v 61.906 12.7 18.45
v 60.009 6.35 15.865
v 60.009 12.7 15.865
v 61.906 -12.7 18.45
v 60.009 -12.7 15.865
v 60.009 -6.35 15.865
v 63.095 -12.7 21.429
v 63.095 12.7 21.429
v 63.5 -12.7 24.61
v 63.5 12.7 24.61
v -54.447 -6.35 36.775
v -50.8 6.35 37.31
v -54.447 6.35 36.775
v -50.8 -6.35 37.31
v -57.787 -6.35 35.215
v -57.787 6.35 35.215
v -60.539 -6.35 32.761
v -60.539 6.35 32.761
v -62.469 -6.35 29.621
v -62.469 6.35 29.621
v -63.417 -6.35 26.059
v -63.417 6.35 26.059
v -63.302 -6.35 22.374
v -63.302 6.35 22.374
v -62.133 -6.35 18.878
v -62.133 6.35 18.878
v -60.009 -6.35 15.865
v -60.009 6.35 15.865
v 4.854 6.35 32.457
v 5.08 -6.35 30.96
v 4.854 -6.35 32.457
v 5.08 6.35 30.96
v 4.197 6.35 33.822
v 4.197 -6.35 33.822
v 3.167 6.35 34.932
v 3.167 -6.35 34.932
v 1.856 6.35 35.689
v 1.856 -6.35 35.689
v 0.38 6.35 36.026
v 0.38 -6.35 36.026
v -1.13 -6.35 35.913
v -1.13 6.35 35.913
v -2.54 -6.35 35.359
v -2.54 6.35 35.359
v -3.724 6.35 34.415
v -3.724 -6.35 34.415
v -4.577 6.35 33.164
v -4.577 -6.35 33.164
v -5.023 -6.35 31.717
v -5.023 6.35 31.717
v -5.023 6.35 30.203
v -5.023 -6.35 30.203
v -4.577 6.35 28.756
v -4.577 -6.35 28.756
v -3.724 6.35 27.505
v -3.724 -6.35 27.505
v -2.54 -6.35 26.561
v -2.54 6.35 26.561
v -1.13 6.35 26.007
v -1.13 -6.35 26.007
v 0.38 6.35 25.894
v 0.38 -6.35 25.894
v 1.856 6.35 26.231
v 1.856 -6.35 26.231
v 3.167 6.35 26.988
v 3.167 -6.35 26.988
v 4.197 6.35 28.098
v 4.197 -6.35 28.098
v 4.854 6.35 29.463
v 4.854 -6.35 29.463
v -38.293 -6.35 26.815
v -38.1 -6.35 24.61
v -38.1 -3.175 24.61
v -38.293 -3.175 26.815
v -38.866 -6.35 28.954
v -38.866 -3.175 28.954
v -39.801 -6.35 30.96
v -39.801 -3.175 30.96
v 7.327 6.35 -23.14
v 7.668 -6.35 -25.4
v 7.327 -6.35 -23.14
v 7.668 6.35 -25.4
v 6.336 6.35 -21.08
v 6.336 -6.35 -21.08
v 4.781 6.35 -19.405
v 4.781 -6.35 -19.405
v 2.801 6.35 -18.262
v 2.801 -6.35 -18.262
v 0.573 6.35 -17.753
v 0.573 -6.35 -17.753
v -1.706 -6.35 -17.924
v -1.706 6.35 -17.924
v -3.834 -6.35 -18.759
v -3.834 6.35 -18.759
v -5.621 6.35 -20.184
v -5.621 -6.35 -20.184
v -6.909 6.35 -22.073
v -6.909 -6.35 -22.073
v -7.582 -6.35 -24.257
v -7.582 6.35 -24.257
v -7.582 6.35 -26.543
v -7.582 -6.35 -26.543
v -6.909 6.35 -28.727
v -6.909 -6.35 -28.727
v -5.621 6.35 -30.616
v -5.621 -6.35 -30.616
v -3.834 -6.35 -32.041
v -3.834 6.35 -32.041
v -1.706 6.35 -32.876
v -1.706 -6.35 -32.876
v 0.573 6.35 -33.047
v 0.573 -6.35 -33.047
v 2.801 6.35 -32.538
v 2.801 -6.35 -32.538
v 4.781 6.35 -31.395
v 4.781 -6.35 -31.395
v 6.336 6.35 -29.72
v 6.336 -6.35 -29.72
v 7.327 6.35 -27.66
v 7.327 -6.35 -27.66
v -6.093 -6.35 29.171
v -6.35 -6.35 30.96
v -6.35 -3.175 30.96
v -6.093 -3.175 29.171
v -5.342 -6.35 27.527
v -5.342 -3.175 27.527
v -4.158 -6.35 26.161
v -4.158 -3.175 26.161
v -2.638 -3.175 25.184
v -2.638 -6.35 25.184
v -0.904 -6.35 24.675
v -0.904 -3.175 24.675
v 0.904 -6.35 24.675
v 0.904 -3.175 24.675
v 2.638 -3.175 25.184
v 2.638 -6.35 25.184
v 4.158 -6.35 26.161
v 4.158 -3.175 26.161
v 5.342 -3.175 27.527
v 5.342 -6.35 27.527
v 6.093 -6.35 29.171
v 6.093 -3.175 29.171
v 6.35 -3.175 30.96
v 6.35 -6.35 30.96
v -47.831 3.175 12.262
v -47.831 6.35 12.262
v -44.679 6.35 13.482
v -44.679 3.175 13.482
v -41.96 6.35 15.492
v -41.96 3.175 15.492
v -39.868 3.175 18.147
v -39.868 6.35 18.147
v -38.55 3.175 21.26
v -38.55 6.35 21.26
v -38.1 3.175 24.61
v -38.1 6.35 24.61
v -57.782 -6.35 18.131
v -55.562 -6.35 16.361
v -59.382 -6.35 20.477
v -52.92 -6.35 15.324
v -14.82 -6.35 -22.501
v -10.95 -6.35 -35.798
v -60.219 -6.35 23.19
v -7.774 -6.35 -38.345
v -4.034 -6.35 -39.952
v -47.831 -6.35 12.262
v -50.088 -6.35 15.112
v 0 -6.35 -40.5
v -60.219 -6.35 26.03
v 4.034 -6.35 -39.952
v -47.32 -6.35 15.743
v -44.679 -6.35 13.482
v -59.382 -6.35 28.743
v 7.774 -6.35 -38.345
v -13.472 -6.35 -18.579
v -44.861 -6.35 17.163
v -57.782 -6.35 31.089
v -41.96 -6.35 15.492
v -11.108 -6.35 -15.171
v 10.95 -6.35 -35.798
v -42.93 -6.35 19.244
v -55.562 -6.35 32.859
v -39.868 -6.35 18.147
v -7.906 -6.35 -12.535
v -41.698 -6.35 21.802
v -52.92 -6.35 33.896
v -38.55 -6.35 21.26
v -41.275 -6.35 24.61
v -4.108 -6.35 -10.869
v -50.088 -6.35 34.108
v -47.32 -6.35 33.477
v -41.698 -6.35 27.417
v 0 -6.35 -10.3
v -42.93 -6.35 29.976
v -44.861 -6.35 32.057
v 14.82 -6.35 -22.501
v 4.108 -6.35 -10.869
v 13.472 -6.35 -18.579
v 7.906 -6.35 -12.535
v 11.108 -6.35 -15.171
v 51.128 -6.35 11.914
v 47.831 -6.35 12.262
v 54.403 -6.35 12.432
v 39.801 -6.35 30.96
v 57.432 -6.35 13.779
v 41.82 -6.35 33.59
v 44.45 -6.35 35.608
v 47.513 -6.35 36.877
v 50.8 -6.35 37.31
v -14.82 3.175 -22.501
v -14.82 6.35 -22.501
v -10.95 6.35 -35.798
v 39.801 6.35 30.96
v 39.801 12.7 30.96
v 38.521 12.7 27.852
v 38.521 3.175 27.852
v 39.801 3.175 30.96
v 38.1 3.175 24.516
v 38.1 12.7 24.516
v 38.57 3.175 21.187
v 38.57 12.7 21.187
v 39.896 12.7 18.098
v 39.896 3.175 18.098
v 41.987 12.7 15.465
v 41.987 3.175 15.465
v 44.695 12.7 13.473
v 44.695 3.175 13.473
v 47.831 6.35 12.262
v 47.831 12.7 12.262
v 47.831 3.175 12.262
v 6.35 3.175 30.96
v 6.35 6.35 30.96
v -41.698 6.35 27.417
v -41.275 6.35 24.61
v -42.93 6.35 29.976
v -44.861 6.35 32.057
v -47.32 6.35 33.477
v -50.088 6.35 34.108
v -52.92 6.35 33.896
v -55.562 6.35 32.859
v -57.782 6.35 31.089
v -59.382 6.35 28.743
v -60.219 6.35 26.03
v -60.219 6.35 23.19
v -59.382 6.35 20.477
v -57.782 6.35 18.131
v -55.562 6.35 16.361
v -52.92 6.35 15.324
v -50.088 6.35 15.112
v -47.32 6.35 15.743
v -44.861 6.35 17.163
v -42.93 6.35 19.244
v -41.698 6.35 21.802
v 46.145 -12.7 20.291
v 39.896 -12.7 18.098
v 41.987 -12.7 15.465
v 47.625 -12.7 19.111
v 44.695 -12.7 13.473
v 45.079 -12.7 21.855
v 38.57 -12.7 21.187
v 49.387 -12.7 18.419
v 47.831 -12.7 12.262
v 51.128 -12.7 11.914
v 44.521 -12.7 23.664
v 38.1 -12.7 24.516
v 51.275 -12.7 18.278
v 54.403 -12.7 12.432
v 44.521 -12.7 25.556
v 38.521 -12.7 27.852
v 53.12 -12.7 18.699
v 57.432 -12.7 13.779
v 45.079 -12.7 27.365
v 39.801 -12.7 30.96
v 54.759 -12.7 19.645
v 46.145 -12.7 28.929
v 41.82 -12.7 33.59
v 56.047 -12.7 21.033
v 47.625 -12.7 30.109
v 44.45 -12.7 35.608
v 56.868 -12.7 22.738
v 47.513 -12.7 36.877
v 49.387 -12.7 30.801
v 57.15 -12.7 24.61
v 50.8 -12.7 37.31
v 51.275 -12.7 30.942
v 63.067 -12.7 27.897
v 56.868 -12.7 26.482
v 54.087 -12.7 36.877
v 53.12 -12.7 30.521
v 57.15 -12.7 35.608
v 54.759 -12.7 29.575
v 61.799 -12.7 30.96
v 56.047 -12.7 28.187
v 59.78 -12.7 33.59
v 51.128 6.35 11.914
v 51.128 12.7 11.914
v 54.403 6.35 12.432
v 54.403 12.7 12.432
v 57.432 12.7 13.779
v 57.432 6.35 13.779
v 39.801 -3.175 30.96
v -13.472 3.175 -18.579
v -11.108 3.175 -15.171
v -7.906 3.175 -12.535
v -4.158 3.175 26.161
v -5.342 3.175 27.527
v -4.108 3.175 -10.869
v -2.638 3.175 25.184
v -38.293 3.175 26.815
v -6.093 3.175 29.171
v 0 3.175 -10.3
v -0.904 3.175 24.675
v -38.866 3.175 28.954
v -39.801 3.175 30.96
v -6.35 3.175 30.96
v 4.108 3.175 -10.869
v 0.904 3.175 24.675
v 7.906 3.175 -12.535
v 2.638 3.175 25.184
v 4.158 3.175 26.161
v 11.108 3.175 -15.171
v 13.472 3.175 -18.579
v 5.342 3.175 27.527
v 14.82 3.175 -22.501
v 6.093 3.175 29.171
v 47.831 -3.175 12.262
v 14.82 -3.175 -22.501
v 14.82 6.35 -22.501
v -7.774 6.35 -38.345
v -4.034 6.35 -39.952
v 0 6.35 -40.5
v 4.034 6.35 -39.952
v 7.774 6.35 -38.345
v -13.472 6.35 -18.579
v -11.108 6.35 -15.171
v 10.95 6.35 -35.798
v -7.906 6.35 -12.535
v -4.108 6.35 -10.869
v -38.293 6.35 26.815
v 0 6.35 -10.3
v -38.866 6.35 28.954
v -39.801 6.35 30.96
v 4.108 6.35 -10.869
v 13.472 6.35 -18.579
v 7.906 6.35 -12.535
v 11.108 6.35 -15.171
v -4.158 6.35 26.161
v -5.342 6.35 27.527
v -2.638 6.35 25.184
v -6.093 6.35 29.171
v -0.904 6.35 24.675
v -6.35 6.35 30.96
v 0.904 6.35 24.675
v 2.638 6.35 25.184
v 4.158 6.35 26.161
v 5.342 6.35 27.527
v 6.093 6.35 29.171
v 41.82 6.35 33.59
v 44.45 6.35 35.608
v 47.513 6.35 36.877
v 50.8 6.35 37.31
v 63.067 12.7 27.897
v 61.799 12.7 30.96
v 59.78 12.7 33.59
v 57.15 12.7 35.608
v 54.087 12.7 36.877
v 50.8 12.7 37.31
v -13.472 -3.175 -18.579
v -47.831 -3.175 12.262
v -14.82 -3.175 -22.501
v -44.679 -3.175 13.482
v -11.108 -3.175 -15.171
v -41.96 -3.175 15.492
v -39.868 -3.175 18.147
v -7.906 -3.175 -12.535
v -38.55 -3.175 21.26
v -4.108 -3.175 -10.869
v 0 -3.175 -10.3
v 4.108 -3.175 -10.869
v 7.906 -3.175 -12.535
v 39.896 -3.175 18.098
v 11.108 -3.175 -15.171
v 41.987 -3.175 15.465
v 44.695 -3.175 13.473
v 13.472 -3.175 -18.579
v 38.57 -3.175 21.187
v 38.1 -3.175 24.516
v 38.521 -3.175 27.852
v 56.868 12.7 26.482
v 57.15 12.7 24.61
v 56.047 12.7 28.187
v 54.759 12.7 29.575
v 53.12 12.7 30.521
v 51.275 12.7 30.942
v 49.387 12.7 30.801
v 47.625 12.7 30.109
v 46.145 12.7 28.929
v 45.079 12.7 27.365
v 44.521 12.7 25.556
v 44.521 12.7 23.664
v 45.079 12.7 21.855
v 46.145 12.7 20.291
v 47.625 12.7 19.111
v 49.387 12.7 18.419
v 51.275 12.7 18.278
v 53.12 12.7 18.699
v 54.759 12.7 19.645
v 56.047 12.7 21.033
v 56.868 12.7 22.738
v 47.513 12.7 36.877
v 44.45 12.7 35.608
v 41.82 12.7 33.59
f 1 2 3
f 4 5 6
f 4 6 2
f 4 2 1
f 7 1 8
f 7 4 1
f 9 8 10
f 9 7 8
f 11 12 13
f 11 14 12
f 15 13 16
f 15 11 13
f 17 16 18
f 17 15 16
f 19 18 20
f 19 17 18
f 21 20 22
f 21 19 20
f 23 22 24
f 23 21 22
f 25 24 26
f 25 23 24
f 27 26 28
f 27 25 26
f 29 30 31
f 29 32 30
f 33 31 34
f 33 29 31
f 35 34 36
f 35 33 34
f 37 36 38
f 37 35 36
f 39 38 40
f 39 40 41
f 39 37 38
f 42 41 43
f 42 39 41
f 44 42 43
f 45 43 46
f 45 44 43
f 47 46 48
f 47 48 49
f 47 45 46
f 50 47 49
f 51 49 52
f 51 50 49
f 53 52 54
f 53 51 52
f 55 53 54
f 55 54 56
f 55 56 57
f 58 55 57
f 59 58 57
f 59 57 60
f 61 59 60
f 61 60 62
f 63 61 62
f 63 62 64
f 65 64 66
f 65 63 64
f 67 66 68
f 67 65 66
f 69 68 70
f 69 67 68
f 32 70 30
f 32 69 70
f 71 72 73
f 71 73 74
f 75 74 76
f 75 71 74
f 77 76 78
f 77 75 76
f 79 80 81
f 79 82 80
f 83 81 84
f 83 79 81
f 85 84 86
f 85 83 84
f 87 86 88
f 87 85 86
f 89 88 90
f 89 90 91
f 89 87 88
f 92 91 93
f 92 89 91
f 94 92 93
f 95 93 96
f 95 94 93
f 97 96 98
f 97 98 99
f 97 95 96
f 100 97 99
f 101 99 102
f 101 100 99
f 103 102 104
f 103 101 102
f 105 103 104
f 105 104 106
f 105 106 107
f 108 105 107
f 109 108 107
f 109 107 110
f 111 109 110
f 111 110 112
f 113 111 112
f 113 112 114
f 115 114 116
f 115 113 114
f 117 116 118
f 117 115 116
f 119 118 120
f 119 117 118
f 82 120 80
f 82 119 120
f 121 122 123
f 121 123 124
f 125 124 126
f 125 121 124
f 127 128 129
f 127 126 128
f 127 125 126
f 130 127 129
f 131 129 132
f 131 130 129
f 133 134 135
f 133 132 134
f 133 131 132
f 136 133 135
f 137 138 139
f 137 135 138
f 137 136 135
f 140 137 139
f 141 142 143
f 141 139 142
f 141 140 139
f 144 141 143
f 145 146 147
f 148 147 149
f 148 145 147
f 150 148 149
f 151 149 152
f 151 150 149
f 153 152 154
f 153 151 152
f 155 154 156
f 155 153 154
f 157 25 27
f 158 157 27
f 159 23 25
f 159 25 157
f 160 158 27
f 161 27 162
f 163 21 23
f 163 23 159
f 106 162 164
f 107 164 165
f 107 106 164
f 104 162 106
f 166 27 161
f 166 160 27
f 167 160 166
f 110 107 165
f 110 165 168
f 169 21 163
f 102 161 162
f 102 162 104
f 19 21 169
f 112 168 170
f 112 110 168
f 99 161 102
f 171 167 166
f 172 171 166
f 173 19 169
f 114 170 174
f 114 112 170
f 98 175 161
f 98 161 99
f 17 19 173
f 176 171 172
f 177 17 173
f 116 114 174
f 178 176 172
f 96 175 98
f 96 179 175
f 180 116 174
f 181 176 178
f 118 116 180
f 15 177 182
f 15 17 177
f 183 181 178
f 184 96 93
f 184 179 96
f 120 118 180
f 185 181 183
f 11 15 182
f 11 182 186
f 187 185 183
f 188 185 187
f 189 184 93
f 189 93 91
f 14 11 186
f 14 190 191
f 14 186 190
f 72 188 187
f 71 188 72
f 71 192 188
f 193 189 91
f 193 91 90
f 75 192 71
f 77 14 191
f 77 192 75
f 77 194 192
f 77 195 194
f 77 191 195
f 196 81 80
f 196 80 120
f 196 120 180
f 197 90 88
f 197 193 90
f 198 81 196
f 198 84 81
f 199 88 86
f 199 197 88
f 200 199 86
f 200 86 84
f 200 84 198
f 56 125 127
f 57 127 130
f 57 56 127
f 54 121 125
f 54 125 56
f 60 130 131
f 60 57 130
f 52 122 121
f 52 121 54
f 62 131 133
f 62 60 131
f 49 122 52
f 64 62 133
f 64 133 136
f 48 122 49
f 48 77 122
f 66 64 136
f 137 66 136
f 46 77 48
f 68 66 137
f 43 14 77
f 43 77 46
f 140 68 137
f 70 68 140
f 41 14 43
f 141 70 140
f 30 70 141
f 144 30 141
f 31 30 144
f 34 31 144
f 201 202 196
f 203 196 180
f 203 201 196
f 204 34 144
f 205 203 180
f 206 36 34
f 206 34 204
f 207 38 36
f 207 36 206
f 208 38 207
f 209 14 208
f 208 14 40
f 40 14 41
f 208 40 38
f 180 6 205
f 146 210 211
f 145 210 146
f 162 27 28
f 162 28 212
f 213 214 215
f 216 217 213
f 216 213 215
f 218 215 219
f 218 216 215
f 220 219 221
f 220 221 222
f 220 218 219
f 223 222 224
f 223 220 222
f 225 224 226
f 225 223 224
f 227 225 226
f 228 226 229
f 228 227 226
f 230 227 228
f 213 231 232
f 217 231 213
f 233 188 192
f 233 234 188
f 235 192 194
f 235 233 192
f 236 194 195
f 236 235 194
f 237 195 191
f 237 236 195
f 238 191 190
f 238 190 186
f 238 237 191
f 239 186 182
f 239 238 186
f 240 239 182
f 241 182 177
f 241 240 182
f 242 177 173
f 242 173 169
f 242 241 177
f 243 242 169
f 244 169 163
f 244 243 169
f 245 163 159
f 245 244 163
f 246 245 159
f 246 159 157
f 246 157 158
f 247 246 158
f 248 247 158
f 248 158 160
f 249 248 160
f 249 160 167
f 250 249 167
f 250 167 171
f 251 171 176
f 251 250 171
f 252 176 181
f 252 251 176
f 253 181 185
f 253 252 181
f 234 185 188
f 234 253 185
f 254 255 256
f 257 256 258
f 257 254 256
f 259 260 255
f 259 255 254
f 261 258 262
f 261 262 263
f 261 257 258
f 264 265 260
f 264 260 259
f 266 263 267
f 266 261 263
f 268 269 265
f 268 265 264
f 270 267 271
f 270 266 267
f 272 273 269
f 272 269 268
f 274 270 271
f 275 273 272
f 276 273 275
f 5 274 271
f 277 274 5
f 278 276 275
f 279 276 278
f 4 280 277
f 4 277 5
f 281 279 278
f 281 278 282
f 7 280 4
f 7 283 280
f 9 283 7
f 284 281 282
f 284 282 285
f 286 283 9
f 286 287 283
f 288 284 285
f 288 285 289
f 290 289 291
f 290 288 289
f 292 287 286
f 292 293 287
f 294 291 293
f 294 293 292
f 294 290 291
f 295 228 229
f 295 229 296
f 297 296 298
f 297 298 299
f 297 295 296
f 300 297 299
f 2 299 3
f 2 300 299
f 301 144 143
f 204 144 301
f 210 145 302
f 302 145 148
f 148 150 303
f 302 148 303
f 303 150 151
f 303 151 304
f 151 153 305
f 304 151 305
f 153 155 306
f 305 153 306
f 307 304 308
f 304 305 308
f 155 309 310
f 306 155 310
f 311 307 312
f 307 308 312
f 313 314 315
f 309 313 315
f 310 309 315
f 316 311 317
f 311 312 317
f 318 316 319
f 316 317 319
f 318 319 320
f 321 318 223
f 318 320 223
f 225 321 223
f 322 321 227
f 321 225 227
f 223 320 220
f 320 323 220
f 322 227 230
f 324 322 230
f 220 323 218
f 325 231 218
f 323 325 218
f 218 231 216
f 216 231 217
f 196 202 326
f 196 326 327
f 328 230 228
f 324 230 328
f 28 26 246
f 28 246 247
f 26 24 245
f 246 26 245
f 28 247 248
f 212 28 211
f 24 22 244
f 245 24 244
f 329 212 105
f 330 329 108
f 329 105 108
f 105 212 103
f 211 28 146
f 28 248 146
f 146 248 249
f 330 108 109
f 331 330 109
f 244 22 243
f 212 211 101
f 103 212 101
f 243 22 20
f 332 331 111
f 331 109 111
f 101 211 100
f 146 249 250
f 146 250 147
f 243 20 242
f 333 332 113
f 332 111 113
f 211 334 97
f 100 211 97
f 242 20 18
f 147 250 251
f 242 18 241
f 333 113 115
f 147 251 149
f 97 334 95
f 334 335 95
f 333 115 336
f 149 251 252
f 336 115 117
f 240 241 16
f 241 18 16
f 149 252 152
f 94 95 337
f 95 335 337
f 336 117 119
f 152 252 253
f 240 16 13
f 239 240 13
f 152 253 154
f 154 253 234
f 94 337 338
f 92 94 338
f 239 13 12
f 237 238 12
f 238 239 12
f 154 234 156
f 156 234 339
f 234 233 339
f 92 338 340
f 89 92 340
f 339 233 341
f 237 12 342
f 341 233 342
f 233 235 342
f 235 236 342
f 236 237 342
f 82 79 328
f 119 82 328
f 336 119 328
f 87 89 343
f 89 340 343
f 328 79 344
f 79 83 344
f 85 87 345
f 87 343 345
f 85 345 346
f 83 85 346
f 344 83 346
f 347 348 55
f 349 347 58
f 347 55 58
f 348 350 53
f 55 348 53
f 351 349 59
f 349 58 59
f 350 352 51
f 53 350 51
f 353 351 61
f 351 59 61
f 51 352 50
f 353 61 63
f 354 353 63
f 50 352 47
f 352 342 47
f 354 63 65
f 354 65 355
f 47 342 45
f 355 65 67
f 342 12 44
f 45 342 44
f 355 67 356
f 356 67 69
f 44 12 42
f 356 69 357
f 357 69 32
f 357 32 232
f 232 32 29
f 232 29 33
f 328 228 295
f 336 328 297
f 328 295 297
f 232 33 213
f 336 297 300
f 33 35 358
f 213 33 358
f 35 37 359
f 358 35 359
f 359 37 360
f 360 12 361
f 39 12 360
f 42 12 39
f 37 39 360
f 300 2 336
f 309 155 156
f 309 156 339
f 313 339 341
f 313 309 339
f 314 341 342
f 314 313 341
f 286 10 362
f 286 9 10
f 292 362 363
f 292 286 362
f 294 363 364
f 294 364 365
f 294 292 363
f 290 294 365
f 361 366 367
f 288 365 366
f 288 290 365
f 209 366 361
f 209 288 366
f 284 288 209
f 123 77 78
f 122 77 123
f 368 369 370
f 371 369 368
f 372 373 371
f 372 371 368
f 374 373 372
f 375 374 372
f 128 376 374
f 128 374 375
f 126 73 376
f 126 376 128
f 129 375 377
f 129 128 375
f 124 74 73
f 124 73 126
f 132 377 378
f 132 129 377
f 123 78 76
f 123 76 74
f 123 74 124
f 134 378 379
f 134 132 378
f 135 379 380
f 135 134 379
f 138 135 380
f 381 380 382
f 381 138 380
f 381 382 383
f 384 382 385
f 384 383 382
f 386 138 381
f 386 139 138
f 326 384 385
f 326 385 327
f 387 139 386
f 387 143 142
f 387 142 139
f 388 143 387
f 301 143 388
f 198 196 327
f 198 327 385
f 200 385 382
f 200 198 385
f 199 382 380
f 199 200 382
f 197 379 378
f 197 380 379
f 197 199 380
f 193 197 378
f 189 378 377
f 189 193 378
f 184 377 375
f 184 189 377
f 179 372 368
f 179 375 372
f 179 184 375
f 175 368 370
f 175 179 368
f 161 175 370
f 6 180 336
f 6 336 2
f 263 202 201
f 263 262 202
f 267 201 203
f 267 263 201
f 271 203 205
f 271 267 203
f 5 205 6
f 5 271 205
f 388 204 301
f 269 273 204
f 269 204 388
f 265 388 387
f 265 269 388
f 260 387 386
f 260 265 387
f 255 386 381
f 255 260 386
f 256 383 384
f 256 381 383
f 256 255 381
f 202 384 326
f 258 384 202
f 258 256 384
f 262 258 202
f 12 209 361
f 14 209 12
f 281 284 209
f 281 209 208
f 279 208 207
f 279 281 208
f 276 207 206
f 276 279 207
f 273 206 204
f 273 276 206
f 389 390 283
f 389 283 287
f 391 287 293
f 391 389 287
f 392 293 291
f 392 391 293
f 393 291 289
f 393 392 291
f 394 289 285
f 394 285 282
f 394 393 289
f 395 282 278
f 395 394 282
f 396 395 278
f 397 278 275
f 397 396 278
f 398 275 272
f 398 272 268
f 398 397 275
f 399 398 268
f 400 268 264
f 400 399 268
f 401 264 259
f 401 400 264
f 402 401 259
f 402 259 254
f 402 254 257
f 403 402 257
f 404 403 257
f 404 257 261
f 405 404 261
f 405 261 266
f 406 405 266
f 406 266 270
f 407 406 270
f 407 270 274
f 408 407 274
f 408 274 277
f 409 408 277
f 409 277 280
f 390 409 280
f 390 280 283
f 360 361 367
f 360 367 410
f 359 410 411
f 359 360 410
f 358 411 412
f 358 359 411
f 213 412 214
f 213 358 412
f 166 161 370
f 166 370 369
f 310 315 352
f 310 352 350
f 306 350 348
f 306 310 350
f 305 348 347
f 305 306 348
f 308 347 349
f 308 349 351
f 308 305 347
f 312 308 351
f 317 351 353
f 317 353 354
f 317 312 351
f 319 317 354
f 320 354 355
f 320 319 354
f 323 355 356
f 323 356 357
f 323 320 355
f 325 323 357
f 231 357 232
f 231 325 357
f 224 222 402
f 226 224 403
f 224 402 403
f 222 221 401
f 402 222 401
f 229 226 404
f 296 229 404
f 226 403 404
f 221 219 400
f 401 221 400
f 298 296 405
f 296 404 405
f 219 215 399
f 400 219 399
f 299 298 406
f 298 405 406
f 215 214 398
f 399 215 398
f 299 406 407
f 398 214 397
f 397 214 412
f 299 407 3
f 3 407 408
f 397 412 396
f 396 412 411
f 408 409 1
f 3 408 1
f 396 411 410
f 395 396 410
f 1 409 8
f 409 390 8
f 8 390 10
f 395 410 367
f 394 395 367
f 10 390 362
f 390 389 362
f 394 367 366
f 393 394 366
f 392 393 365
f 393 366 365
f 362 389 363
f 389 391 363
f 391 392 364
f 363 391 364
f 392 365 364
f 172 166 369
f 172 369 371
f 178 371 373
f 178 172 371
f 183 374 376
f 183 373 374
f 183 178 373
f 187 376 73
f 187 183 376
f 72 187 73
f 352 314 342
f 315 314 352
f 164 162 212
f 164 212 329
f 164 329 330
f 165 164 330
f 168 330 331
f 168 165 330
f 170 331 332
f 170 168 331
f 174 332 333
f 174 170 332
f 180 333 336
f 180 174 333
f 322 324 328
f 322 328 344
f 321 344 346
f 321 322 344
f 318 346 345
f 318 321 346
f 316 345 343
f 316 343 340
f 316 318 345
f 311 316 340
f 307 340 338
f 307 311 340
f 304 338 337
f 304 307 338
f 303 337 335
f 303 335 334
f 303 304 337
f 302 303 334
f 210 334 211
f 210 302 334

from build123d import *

# Parameters (mm, degrees)
F0_R     = 9.525
F0_R_2   = 5.08
F0_R_3   = 6.35
F0_R_4   = 7.668055
F1_DEPTH = 6.35
F2_DEPTH = 3.175
F3_DEPTH = 12.7


with BuildPart() as f1:
    # F0 (on Front) → F1 (new body, symmetric)
    with BuildSketch(Plane.XZ):
        with BuildLine():
            ThreePointArc((-47.831061, 12.261839), (-40.825144, 16.749128), (-38.1, 24.609932))
            ThreePointArc((-38.1, 24.609932), (-38.532742, 27.896934), (-39.801477, 30.959932))
            ThreePointArc((-39.801477, 30.959932), (-44.45, 35.608455), (-50.8, 37.309932))
            ThreePointArc((-50.8, 37.309932), (-62.469497, 29.621203), (-60.009293, 15.864709))
            ThreePointArc((-60.009293, 15.864709), (-54.40287, 12.4317), (-47.831061, 12.261839))
        make_face()
        with Locations((-50.8, 24.609932)):
            Circle(F0_R, mode=Mode.SUBTRACT)
        with BuildLine():
            ThreePointArc((-50.8, 37.309932), (-44.45, 35.608455), (-39.801477, 30.959932))
            Line((-39.801477, 30.959932), (-6.35, 30.959932))
            ThreePointArc((-6.35, 30.959932), (-4.490128, 35.45006), (0, 37.309932))
            Line((0, 37.309932), (-50.8, 37.309932))
        make_face()
        with BuildLine():
            ThreePointArc((0, 37.309932), (-4.490128, 35.45006), (-6.35, 30.959932))
            ThreePointArc((-6.35, 30.959932), (0, 24.609932), (6.35, 30.959932))
            ThreePointArc((6.35, 30.959932), (4.490128, 35.45006), (0, 37.309932))
        make_face()
        with Locations((0, 30.959932)):
            Circle(F0_R_2, mode=Mode.SUBTRACT)
        with BuildLine():
            Line((50.8, 37.309932), (0, 37.309932))
            ThreePointArc((0, 37.309932), (4.490128, 35.45006), (6.35, 30.959932))
            Line((6.35, 30.959932), (39.801477, 30.959932))
            ThreePointArc((39.801477, 30.959932), (44.45, 35.608455), (50.8, 37.309932))
        make_face()
        with BuildLine():
            ThreePointArc((63.5, 24.609932), (59.780256, 33.590188), (50.8, 37.309932))
            ThreePointArc((50.8, 37.309932), (44.45, 35.608455), (39.801477, 30.959932))
            ThreePointArc((39.801477, 30.959932), (39.130503, 19.598661), (47.831061, 12.261839))
            ThreePointArc((47.831061, 12.261839), (54.40287, 12.4317), (60.009293, 15.864709))
            ThreePointArc((60.009293, 15.864709), (62.595084, 19.901855), (63.5, 24.609932))
        make_face()
        with Locations((50.8, 24.609932)):
            Circle(F0_R_3, mode=Mode.SUBTRACT)
        with BuildLine():
            Line((47.831061, 12.261839), (14.819522, -22.501475))
            ThreePointArc((14.819522, -22.501475), (15.029956, -23.943953), (15.10032, -25.4))
            ThreePointArc((15.10032, -25.4), (14.024374, -30.997911), (10.949864, -35.798084))
            Line((10.949864, -35.798084), (60.009293, 15.864709))
            ThreePointArc((60.009293, 15.864709), (54.40287, 12.4317), (47.831061, 12.261839))
        make_face()
        with BuildLine():
            ThreePointArc((14.819522, -22.501475), (0, -10.29968), (-14.819522, -22.501475))
            ThreePointArc((-14.819522, -22.501475), (-14.498802, -29.619527), (-10.949864, -35.798084))
            ThreePointArc((-10.949864, -35.798084), (0, -40.50032), (10.949864, -35.798084))
            ThreePointArc((10.949864, -35.798084), (14.024374, -30.997911), (15.10032, -25.4))
            ThreePointArc((15.10032, -25.4), (15.029956, -23.943953), (14.819522, -22.501475))
        make_face()
        with Locations((0, -25.4)):
            Circle(F0_R_4, mode=Mode.SUBTRACT)
        with BuildLine():
            Line((-14.819522, -22.501475), (-47.831061, 12.261839))
            ThreePointArc((-47.831061, 12.261839), (-54.40287, 12.4317), (-60.009293, 15.864709))
            Line((-60.009293, 15.864709), (-10.949864, -35.798084))
            ThreePointArc((-10.949864, -35.798084), (-14.498802, -29.619527), (-14.819522, -22.501475))
        make_face()
    extrude(amount=F1_DEPTH, both=True)

    # F0 (on Front) → F2 (join, symmetric)
    with BuildSketch(Plane.XZ):
        with BuildLine():
            ThreePointArc((-39.801477, 30.959932), (-38.532742, 27.896934), (-38.1, 24.609932))
            ThreePointArc((-38.1, 24.609932), (-40.825144, 16.749128), (-47.831061, 12.261839))
            Line((-47.831061, 12.261839), (-14.819522, -22.501475))
            ThreePointArc((-14.819522, -22.501475), (0, -10.29968), (14.819522, -22.501475))
            Line((14.819522, -22.501475), (47.831061, 12.261839))
            ThreePointArc((47.831061, 12.261839), (39.130503, 19.598661), (39.801477, 30.959932))
            Line((39.801477, 30.959932), (6.35, 30.959932))
            ThreePointArc((6.35, 30.959932), (0, 24.609932), (-6.35, 30.959932))
            Line((-6.35, 30.959932), (-39.801477, 30.959932))
        make_face()
    extrude(amount=F2_DEPTH, both=True)

    # F0 (on Front) → F3 (join, symmetric)
    with BuildSketch(Plane.XZ):
        with BuildLine():
            ThreePointArc((63.5, 24.609932), (59.780256, 33.590188), (50.8, 37.309932))
            ThreePointArc((50.8, 37.309932), (44.45, 35.608455), (39.801477, 30.959932))
            ThreePointArc((39.801477, 30.959932), (39.130503, 19.598661), (47.831061, 12.261839))
            ThreePointArc((47.831061, 12.261839), (54.40287, 12.4317), (60.009293, 15.864709))
            ThreePointArc((60.009293, 15.864709), (62.595084, 19.901855), (63.5, 24.609932))
        make_face()
        with Locations((50.8, 24.609932)):
            Circle(F0_R_3, mode=Mode.SUBTRACT)
    extrude(amount=F3_DEPTH, both=True)


solid = f1.part
